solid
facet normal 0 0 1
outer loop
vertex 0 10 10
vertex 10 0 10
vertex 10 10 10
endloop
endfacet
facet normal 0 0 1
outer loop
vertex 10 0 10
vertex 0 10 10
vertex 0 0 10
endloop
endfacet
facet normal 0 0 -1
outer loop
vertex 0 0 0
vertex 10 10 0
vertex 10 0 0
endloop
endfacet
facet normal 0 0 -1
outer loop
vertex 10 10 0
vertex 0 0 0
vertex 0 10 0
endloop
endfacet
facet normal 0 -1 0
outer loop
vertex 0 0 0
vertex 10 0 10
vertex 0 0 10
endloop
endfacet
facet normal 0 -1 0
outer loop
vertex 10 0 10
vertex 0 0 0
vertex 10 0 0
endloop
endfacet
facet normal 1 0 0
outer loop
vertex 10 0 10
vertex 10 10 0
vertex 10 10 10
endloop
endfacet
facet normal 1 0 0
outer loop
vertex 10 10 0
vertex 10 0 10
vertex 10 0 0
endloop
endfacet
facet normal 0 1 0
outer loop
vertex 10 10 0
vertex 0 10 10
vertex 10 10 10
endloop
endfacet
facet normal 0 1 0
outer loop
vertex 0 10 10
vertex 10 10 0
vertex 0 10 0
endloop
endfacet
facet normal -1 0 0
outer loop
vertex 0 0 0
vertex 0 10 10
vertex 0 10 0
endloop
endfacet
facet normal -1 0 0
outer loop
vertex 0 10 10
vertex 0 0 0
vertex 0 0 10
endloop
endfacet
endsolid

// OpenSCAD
// file: ../scad/lib/helpers.scad
// Helper functions for ebike frame primitives

// Convert direction vector to Euler angles for use with rotate()
// Input: direction vector [x, y, z]
// Output: Euler angles [rx, ry, rz] compatible with OpenSCAD rotate()
function vector_to_euler(v) =
    let(
        // Normalize the vector
        len = norm(v),
        u = len > 0 ? v / len : [0, 0, 1],

        // Calculate rotation angles
        // ry: rotation around Y axis (in XZ plane)
        ry = atan2(u[0], u[2]),

        // rx: rotation around X axis (elevation)
        rx = -atan2(u[1], sqrt(u[0]*u[0] + u[2]*u[2])),

        // rz: no roll (keep vertical orientation)
        rz = 0
    )
    [rx, ry, rz];
// file: ../scad/lib/tube_sizes.scad
// TubeSize struct and standard tube definitions
// Hybrid accessor pattern: indexed lists with constructor and accessor functions

include <bolt_sizes.scad>

// Internal indices (private)
_TUBE_OUTER_RADIUS = 0;
_TUBE_THICKNESS = 1;
_TUBE_SOCKET_DEPTH = 2;
_TUBE_SOCKET_CLEARANCE = 3;
_TUBE_EXTENSION_DEPTH = 4;
_TUBE_COLLAR_THICKNESS = 5;
_TUBE_BOLT_SIZE = 6;

// Constructor
function TubeSize(outer_r, thickness, socket_depth, socket_clearance, extension_depth, collar_thickness, bolt_size) =
    [outer_r, thickness, socket_depth, socket_clearance, extension_depth, collar_thickness, bolt_size];

// Accessors
function tube_outer_radius(ts) = ts[_TUBE_OUTER_RADIUS];
function tube_thickness(ts) = ts[_TUBE_THICKNESS];
function tube_socket_depth(ts) = ts[_TUBE_SOCKET_DEPTH];
function tube_socket_clearance(ts) = ts[_TUBE_SOCKET_CLEARANCE];
function tube_extension_depth(ts) = ts[_TUBE_EXTENSION_DEPTH];
function tube_collar_thickness(ts) = ts[_TUBE_COLLAR_THICKNESS];
function tube_bolt_size(ts) = ts[_TUBE_BOLT_SIZE];

// Standard tube sizes based on current frame design
DOWN_TUBE = TubeSize(
    22,     // outer_radius (44mm OD)
    3,      // thickness
    40,     // socket_depth
    0.5,    // socket_clearance
    50,     // extension_depth
    6,      // collar_thickness
    M6_BOLT // bolt_size
);

SEAT_TUBE = TubeSize(
    17,     // outer_radius (34mm OD)
    3.4,    // thickness (ID = 27.2mm for seatpost)
    40,     // socket_depth
    0.5,    // socket_clearance
    50,     // extension_depth
    6,      // collar_thickness
    M6_BOLT // bolt_size
);

TOP_TUBE = TubeSize(
    16,     // outer_radius (32mm OD)
    2.5,    // thickness
    40,     // socket_depth
    0.5,    // socket_clearance
    50,     // extension_depth
    6,      // collar_thickness
    M6_BOLT // bolt_size
);

CHAINSTAY = TubeSize(
    11,     // outer_radius (22mm OD)
    2.5,    // thickness
    40,     // socket_depth
    0.5,    // socket_clearance
    50,     // extension_depth
    6,      // collar_thickness
    M5_BOLT // bolt_size (smaller bolts for chainstays)
);

SEATSTAY = TubeSize(
    8,      // outer_radius (16mm OD)
    2,      // thickness
    40,     // socket_depth
    0.5,    // socket_clearance
    50,     // extension_depth
    6,      // collar_thickness
    M5_BOLT // bolt_size (smaller bolts for seatstays)
);
// file: ../scad/lib/bolt_sizes.scad
// BoltSize struct and standard bolt definitions
// Hybrid accessor pattern: indexed lists with constructor and accessor functions

// Internal indices (private)
_BOLT_TAP_RADIUS = 0;
_BOLT_CLEARANCE_RADIUS = 1;
_BOLT_COUNTERBORE_RADIUS = 2;
_BOLT_COUNTERBORE_DEPTH = 3;
_BOLT_BOSS_RADIUS = 4;
_BOLT_THROUGH_RADIUS = 5;

// Constructor
function BoltSize(tap_r, clearance_r, counterbore_r, counterbore_d, boss_r, through_r) =
    [tap_r, clearance_r, counterbore_r, counterbore_d, boss_r, through_r];

// Accessors
function bolt_tap_radius(bs) = bs[_BOLT_TAP_RADIUS];
function bolt_clearance_radius(bs) = bs[_BOLT_CLEARANCE_RADIUS];
function bolt_counterbore_radius(bs) = bs[_BOLT_COUNTERBORE_RADIUS];
function bolt_counterbore_depth(bs) = bs[_BOLT_COUNTERBORE_DEPTH];
function bolt_boss_radius(bs) = bs[_BOLT_BOSS_RADIUS];
function bolt_through_radius(bs) = bs[_BOLT_THROUGH_RADIUS];

// Standard bolt sizes
M5_BOLT = BoltSize(
    2.1,    // tap_radius (M5 tap drill 4.2mm diameter)
    2.75,   // clearance_radius (5.5mm clearance hole)
    4.25,   // counterbore_radius (8.5mm socket head)
    2.5,    // counterbore_depth
    6,      // boss_radius
    2.75    // through_radius (5.5mm in plastic)
);

M6_BOLT = BoltSize(
    2.5,    // tap_radius (M6 tap drill 5.0mm diameter)
    3.25,   // clearance_radius (6.5mm clearance hole)
    4.75,   // counterbore_radius (9.5mm socket head)
    2.5,    // counterbore_depth
    8,      // boss_radius
    3.25    // through_radius (6.5mm in plastic)
);
// main file
// Phase 1 Verification: Test BoltSize and TubeSize structs

include <../scad/config.scad>

// Test BoltSize accessors
echo("=== M6 Bolt Tests ===");
echo("M6 tap radius:", bolt_tap_radius(M6_BOLT));
echo("M6 clearance radius:", bolt_clearance_radius(M6_BOLT));
echo("M6 counterbore radius:", bolt_counterbore_radius(M6_BOLT));
echo("M6 boss radius:", bolt_boss_radius(M6_BOLT));

echo("=== M5 Bolt Tests ===");
echo("M5 tap radius:", bolt_tap_radius(M5_BOLT));
echo("M5 clearance radius:", bolt_clearance_radius(M5_BOLT));

// Test TubeSize accessors
echo("=== Down Tube Tests ===");
echo("Down tube outer radius:", tube_outer_radius(DOWN_TUBE));
echo("Down tube thickness:", tube_thickness(DOWN_TUBE));
echo("Down tube socket depth:", tube_socket_depth(DOWN_TUBE));
echo("Down tube extension depth:", tube_extension_depth(DOWN_TUBE));

echo("=== Seat Tube Tests ===");
echo("Seat tube outer radius:", tube_outer_radius(SEAT_TUBE));
echo("Seat tube bolt tap radius:", bolt_tap_radius(tube_bolt_size(SEAT_TUBE)));

echo("=== Chainstay Tests ===");
echo("Chainstay outer radius:", tube_outer_radius(CHAINSTAY));
echo("Chainstay bolt (M5) tap radius:", bolt_tap_radius(tube_bolt_size(CHAINSTAY)));

// Test vector_to_euler helper
echo("=== vector_to_euler Tests ===");
test_vec1 = [1, 0, 0];
test_vec2 = [0, 1, 0];
test_vec3 = [0, 0, 1];
test_vec4 = [1, 1, 1];
echo("Vector [1,0,0] -> Euler:", vector_to_euler(test_vec1));
echo("Vector [0,1,0] -> Euler:", vector_to_euler(test_vec2));
echo("Vector [0,0,1] -> Euler:", vector_to_euler(test_vec3));
echo("Vector [1,1,1] -> Euler:", vector_to_euler(test_vec4));

// Simple visual test - render a cube if everything parses
cube([10, 10, 10]);
